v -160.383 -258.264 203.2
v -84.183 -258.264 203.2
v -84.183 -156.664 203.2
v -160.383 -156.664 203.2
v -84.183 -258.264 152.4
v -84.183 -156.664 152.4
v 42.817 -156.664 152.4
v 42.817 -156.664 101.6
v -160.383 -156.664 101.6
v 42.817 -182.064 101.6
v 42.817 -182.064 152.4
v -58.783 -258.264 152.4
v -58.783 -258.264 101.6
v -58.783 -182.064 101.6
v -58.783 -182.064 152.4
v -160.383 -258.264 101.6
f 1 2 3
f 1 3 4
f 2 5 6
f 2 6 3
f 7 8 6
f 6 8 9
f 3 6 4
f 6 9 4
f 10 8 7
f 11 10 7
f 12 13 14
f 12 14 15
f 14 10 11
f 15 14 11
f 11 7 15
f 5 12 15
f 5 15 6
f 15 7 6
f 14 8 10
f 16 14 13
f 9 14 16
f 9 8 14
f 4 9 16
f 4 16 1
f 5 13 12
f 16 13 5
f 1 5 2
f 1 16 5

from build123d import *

# Parameters (mm, degrees)
F0_W     = 101.6
F0_H     = 76.2000028044
F1_DEPTH = 101.6
F2_W     = 50.8
F2_H     = 25.4
F3_DEPTH = 101.6
F4_W     = 50.8
F4_H     = 101.6
F5_DEPTH = 25.4
F6_ANGLE = 90
F7_ANGLE = -90


# Not quite as in the source:
# - a feature names something its author has since deleted; it is built from what else it names


with BuildPart() as f1:
    # F0 (on Top) → F1 (new body)
    with BuildSketch(Plane.XY):
        with Locations((-7.9828569114, 8.4364293143)):
            Rectangle(F0_W, F0_H)
    extrude(amount=F1_DEPTH)

    # F2 (on Top) → F3 (join)
    with BuildSketch(Plane.XY):
        with Locations((-33.3828569114, -42.3635720879)):
            Rectangle(F2_W, F2_H)
    extrude(amount=F3_DEPTH)

    # F4 (on Top) → F5 (join)
    with BuildSketch(Plane.XY):
        with Locations((-33.3828569114, -105.8635720879)):
            Rectangle(F4_W, F4_H)
    extrude(amount=F5_DEPTH)


with BuildPart() as f1_1:
    # F6: moved
    add(f1.part.rotate(Axis((-58.7828569114, -4.2635706857, 101.6), (0, -1, 0)), F6_ANGLE))


with BuildPart() as f1_2:
    # F7: moved
    add(f1_1.part.rotate(Axis((42.8171430886, -156.6635720879, 127), (0, 0, -1)), F7_ANGLE))


solid = f1_2.part
